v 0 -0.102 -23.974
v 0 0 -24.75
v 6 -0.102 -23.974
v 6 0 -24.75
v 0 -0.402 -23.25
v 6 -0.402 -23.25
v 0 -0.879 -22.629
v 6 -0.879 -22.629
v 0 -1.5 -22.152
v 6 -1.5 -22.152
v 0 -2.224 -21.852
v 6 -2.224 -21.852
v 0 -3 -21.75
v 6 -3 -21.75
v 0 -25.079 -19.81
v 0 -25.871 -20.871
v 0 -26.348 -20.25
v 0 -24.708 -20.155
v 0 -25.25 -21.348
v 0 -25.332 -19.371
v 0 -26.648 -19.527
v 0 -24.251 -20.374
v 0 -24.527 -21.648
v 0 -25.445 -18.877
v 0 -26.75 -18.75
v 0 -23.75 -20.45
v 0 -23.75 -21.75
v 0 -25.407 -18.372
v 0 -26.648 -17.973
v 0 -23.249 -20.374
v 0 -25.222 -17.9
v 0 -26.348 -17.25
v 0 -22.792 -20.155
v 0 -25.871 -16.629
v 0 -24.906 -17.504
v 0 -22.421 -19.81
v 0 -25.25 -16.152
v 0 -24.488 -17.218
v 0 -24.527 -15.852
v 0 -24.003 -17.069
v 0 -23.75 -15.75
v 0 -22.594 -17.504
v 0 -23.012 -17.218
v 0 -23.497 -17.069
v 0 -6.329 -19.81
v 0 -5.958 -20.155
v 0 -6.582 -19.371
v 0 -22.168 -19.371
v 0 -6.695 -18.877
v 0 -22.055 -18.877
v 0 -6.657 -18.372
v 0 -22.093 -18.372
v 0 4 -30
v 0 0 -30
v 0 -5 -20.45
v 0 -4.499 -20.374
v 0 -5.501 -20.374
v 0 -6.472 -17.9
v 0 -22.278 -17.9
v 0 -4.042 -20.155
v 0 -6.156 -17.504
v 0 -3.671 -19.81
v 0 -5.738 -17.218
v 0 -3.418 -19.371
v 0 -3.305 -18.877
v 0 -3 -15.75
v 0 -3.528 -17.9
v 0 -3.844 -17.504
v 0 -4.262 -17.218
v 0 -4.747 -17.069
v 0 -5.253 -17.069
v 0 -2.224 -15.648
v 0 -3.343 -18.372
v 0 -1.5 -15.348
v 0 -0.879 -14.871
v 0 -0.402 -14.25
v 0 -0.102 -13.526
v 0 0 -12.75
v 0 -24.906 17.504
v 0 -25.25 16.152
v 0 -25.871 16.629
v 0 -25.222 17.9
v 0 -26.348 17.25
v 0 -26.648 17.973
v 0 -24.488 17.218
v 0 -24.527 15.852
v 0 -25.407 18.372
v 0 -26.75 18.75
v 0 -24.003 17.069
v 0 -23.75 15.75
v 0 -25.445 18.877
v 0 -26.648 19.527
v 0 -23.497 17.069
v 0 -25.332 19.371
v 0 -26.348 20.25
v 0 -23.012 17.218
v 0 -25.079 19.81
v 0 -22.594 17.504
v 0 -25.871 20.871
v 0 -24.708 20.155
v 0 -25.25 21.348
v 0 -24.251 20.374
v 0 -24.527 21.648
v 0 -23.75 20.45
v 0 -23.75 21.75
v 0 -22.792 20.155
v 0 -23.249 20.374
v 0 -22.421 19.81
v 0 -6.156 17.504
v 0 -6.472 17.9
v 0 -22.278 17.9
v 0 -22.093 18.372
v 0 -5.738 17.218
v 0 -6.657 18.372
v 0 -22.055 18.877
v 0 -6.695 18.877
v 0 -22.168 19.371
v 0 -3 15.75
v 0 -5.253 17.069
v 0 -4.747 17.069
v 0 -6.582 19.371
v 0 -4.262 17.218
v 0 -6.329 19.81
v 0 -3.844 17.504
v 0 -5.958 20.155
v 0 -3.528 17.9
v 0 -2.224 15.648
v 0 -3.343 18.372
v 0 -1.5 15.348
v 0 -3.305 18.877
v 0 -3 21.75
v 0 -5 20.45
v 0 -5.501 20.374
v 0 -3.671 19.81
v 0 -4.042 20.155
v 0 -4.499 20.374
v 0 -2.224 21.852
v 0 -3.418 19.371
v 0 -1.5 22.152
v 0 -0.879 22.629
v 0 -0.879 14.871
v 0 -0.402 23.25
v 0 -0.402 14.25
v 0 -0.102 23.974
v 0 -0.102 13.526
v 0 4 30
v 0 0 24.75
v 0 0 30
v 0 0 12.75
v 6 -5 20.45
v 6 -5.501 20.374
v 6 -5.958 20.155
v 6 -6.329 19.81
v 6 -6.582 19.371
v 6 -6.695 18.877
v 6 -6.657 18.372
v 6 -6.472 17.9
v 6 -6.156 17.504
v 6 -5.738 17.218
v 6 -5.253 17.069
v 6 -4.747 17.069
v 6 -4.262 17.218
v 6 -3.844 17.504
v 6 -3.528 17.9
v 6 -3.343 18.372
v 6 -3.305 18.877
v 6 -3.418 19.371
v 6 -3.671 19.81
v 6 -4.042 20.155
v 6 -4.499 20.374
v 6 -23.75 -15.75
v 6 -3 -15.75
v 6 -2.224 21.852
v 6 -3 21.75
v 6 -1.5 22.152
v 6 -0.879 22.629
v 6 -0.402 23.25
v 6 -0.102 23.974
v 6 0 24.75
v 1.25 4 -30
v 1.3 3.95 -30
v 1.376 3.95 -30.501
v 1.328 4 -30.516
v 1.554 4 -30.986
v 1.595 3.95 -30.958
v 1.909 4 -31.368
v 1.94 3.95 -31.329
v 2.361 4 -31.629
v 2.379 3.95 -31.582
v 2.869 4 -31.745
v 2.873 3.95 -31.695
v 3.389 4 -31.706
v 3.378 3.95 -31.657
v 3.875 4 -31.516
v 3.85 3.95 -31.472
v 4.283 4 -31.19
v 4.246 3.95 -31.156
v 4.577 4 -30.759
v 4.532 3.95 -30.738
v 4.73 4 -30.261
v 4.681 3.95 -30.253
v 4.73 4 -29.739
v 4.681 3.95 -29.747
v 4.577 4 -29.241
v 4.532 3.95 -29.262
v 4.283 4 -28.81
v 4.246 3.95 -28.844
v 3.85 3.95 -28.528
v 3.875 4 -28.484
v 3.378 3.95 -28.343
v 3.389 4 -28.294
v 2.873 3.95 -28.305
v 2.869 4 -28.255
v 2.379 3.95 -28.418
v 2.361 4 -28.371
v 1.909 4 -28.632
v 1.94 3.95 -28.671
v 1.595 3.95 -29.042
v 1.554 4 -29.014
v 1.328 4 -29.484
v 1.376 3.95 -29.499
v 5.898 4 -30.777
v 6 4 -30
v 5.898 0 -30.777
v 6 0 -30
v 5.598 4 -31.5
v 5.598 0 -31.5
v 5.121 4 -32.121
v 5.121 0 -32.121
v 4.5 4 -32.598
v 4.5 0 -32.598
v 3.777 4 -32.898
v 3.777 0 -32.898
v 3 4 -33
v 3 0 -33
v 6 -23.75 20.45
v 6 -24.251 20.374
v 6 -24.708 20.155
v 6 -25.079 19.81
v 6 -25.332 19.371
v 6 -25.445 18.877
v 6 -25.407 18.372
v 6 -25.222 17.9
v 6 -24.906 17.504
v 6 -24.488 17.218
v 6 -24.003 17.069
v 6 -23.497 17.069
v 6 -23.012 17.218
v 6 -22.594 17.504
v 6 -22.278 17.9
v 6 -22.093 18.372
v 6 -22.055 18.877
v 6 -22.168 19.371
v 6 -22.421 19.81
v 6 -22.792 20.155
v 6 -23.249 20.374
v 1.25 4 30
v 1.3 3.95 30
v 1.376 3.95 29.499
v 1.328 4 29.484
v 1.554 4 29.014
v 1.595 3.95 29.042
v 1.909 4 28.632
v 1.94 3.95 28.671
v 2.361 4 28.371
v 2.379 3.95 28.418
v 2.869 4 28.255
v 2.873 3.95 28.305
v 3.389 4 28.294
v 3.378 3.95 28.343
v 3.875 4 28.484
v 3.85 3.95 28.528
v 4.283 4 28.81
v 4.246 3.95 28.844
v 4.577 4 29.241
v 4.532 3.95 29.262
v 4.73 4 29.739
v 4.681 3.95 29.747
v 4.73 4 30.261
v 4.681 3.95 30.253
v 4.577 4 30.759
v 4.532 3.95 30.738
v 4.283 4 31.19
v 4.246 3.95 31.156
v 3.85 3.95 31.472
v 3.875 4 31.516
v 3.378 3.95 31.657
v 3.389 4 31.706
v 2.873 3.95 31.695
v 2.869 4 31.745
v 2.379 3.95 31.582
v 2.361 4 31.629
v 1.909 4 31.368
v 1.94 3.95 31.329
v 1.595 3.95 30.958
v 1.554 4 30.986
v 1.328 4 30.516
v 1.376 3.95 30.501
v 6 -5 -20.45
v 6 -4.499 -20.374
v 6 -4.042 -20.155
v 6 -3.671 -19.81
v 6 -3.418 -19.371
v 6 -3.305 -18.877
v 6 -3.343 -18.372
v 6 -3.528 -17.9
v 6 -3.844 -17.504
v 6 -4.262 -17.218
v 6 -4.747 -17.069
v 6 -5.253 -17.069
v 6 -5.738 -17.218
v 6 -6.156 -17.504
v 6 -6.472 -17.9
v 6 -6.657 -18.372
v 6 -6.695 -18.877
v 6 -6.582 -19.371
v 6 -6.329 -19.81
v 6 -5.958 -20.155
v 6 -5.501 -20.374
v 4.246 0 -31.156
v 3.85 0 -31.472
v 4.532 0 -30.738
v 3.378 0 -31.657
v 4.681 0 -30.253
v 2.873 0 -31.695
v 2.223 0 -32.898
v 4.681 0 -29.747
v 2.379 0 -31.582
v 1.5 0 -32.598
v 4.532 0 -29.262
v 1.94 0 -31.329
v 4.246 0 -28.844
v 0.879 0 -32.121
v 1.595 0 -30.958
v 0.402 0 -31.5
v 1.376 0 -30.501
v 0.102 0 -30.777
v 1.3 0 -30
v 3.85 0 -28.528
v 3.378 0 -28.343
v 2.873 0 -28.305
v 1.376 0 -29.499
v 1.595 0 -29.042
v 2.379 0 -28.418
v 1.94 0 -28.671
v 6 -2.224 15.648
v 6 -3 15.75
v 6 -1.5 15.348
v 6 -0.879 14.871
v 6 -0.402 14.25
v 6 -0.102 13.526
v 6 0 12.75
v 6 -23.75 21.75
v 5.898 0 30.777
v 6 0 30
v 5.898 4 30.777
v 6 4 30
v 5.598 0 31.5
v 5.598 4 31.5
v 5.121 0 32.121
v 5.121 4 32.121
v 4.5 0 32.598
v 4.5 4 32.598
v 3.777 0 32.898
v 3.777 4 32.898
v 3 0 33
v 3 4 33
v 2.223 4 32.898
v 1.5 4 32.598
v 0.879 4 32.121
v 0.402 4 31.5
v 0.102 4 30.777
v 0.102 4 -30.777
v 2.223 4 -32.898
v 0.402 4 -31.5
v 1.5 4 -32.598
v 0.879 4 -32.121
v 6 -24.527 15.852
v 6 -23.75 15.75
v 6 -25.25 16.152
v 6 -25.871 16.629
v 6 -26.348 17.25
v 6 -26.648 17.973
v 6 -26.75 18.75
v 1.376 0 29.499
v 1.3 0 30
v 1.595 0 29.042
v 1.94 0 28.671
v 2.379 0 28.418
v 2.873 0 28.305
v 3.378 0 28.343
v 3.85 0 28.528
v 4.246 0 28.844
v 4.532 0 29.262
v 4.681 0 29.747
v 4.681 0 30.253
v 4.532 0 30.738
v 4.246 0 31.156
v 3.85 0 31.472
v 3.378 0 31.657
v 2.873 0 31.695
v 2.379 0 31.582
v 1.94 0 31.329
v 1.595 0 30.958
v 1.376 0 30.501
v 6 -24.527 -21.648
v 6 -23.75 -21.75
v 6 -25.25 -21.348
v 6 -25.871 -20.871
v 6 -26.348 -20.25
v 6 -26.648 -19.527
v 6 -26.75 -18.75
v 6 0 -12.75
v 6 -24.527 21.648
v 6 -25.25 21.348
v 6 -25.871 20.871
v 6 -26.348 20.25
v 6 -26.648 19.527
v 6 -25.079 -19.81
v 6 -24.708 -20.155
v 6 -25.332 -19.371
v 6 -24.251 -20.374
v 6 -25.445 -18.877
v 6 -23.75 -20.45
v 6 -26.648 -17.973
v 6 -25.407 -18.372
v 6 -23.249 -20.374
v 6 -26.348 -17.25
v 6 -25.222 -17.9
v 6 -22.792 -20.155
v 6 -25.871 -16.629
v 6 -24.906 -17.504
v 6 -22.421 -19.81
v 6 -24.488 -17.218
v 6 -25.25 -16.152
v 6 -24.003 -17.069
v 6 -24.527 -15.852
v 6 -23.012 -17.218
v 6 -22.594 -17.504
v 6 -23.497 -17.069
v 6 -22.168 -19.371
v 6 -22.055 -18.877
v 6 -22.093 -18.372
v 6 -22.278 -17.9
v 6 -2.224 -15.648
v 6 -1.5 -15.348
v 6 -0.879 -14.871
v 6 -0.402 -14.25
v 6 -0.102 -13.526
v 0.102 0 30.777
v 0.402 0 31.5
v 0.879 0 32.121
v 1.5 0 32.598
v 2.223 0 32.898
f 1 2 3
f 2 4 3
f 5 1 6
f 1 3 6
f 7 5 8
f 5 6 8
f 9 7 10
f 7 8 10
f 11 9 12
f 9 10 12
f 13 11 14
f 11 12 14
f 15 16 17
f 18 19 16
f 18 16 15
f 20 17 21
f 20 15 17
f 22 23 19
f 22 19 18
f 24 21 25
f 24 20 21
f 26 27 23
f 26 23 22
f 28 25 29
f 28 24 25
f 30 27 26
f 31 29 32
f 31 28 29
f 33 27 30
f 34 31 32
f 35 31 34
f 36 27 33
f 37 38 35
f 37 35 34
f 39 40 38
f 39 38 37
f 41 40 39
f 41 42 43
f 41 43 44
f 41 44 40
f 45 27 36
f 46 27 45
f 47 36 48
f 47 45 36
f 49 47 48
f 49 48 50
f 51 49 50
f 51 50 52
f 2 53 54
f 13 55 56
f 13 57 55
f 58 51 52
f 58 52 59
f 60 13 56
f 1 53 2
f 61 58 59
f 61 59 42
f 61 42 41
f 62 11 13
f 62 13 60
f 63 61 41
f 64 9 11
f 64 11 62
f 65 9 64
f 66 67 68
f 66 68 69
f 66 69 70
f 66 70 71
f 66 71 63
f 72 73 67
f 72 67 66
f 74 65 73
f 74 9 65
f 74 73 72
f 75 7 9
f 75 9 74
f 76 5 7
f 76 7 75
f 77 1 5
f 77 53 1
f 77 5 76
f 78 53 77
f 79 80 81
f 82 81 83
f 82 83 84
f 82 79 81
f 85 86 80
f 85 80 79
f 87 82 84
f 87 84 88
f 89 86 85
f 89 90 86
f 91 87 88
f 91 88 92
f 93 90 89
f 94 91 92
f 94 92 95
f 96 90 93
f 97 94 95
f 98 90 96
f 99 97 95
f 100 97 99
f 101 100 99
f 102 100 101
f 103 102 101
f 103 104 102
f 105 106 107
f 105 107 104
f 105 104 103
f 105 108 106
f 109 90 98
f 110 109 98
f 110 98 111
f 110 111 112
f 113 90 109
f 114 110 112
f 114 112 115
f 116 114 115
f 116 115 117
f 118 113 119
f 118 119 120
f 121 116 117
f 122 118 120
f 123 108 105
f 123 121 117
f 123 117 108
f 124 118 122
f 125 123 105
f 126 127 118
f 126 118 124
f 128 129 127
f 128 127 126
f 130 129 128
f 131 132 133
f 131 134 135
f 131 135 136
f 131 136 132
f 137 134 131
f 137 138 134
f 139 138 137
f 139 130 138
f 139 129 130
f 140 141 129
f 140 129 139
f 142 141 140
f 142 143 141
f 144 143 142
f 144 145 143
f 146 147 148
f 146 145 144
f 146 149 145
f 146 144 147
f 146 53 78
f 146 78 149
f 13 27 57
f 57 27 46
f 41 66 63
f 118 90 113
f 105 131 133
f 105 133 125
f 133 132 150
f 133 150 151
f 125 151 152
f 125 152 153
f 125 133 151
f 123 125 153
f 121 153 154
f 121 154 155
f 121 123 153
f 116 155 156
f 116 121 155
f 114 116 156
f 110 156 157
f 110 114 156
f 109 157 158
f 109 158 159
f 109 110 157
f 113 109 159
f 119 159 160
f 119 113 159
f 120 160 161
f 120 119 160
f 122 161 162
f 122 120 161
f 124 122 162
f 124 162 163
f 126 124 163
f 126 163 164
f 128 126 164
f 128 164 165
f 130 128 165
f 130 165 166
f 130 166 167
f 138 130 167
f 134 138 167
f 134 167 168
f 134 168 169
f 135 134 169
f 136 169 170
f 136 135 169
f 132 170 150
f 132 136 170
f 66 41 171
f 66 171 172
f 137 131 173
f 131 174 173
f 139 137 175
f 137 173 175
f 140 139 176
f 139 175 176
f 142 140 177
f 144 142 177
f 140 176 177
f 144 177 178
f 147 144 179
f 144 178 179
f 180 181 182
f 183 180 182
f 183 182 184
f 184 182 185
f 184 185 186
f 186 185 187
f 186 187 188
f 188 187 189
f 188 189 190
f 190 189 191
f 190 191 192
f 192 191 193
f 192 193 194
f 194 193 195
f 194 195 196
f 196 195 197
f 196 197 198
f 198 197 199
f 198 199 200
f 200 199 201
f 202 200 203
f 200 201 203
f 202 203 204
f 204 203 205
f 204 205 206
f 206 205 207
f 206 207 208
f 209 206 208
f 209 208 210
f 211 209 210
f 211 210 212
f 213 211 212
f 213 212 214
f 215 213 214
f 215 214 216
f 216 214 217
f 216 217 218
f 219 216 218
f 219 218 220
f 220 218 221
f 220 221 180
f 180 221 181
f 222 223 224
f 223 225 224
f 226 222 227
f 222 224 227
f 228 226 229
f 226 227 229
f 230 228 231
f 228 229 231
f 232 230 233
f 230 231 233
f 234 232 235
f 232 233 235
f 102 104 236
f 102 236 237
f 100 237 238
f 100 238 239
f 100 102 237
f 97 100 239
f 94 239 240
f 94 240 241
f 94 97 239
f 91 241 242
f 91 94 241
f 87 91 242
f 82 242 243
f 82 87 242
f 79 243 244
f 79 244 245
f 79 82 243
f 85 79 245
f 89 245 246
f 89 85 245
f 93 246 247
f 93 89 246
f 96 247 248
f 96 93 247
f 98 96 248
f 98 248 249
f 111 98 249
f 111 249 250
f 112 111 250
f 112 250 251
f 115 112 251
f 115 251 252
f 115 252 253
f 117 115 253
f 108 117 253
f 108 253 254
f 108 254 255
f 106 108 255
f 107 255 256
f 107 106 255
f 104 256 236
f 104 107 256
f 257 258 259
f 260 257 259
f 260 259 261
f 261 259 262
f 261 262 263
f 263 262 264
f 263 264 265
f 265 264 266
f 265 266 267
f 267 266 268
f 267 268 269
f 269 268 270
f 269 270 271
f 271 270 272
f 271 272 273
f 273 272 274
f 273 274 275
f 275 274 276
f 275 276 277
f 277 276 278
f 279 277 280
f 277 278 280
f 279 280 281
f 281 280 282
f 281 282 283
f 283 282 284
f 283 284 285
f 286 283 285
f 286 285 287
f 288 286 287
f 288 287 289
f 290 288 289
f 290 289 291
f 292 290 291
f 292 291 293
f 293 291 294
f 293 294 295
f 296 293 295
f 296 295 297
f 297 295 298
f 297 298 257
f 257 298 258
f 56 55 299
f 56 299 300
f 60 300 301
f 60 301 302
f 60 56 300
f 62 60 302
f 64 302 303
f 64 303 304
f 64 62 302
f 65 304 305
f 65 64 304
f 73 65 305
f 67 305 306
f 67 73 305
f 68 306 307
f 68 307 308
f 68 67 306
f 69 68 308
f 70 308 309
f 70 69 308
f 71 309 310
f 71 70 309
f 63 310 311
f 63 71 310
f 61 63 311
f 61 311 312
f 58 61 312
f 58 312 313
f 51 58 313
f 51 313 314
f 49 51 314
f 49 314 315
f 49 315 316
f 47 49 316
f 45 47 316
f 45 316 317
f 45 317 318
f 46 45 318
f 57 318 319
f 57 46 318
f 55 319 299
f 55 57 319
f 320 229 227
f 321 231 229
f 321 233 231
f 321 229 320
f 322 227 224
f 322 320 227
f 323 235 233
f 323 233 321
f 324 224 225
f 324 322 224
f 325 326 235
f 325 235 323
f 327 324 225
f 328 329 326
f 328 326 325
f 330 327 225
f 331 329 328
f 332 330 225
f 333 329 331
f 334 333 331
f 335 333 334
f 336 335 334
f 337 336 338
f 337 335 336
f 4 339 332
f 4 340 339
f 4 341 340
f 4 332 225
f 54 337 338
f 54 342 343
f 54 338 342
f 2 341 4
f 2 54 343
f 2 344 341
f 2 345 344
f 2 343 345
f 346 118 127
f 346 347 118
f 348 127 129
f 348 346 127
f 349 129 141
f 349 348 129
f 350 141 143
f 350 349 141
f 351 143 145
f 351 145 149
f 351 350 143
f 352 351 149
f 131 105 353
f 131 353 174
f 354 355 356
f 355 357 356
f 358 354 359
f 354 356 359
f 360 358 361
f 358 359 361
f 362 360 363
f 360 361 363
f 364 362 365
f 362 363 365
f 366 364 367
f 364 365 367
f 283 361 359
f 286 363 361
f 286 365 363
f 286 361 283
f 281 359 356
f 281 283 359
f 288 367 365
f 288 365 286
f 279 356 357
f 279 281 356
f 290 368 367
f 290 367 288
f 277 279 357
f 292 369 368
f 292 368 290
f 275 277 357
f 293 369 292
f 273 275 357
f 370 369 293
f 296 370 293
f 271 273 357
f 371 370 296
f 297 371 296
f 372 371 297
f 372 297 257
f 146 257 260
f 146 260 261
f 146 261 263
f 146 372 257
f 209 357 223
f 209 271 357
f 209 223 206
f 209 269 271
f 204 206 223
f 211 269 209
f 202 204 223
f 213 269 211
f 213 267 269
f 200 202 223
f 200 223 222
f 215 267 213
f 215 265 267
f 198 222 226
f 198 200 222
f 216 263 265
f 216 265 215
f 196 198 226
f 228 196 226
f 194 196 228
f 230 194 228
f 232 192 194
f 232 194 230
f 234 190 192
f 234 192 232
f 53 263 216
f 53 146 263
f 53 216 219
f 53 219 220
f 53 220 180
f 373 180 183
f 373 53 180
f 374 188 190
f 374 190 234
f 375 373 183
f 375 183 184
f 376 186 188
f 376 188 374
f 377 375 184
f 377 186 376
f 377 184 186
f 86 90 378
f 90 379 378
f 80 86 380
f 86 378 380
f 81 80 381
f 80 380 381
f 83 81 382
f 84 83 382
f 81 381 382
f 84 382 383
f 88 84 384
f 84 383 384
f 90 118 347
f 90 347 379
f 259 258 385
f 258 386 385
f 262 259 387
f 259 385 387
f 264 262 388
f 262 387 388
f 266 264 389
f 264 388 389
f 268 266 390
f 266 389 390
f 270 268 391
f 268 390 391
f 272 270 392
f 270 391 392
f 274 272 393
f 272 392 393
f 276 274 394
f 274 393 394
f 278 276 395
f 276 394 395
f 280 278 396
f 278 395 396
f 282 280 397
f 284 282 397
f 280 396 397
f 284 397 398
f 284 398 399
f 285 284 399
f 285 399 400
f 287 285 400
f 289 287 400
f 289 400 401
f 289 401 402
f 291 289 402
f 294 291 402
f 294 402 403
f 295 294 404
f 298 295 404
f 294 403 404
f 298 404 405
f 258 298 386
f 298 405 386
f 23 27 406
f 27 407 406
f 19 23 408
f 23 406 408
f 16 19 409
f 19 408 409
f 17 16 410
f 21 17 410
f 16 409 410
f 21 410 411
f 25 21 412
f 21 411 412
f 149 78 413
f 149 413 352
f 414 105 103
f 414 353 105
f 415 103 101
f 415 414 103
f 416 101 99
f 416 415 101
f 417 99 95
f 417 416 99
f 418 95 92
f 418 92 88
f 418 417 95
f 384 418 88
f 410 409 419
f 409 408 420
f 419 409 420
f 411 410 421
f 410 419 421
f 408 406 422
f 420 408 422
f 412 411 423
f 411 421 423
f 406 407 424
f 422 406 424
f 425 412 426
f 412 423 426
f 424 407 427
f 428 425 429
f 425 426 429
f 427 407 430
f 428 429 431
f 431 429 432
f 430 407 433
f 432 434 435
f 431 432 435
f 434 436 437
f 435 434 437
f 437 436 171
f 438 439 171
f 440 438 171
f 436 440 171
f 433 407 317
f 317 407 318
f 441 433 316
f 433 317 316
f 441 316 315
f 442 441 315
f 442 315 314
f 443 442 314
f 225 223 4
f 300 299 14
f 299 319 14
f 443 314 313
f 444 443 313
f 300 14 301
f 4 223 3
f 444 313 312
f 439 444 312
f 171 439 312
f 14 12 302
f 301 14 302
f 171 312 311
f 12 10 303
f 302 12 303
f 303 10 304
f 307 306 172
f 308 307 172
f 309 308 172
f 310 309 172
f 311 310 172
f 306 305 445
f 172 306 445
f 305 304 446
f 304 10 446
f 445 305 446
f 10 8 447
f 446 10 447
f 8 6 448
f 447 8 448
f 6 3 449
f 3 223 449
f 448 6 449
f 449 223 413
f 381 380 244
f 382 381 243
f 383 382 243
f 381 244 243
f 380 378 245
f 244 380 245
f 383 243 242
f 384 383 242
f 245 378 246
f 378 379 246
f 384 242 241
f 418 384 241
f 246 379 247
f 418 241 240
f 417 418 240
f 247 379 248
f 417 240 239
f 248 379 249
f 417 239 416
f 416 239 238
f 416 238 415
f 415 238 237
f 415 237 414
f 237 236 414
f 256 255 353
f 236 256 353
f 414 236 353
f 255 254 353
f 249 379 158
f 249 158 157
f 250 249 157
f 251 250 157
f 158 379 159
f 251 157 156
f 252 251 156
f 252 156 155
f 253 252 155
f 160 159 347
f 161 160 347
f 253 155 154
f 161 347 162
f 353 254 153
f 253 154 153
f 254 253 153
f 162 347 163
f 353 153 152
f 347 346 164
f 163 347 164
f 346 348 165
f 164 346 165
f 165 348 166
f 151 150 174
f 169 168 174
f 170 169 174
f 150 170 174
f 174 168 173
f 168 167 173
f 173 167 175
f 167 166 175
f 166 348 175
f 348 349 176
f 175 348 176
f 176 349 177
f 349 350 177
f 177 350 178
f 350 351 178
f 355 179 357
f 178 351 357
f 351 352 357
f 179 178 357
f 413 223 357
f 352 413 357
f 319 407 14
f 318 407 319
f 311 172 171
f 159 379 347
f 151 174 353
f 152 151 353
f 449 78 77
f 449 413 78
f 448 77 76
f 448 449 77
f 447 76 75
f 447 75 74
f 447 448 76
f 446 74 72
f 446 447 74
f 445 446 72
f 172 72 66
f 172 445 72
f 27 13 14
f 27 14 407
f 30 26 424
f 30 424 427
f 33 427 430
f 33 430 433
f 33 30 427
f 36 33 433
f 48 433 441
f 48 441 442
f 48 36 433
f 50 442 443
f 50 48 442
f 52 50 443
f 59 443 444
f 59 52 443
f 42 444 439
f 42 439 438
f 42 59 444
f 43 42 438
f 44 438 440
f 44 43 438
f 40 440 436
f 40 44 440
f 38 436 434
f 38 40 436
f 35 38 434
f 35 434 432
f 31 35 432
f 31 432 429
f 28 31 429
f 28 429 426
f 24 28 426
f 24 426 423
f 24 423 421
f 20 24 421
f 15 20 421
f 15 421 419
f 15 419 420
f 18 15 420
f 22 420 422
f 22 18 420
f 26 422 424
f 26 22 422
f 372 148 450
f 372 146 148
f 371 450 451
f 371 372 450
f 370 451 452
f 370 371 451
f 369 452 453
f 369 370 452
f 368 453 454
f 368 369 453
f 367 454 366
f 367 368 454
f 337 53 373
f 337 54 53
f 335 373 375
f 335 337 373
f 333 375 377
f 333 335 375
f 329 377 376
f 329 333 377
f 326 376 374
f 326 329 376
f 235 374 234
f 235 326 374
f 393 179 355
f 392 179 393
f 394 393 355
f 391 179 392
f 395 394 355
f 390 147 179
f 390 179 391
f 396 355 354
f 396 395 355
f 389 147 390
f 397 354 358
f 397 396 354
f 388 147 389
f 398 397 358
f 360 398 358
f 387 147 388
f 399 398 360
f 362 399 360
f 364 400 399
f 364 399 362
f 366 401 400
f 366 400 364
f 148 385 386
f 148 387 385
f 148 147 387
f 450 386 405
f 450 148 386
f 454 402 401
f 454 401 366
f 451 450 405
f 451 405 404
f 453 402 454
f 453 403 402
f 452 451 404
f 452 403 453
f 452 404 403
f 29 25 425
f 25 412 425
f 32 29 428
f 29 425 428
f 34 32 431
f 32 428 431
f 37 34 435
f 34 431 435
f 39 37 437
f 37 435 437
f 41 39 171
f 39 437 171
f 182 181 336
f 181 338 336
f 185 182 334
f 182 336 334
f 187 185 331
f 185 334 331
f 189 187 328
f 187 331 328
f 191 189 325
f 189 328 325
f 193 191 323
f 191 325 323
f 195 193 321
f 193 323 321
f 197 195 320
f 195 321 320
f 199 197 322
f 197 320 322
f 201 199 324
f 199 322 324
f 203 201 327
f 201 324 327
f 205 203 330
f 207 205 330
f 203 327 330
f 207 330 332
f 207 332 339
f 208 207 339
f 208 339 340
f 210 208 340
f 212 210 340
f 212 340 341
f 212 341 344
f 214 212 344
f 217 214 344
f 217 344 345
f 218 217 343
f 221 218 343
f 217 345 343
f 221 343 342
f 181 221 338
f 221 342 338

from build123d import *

# Parameters (mm, degrees)
SKETCH1_R                                       = 1.7
BOSS_EXTRUDE1_DEPTH                             = 6
CSK_FOR_M3_FLAT_HEAD_MACHINE_SCREW1_D           = 3.4
CSK_FOR_M3_FLAT_HEAD_MACHINE_SCREW1_DEPTH       = 6
CSK_FOR_M3_FLAT_HEAD_MACHINE_SCREW1_CSINK_D     = 3.5
CSK_FOR_M3_FLAT_HEAD_MACHINE_SCREW1_CSINK_ANGLE = 90
CSK_FOR_M3_FLAT_HEAD_MACHINE_SCREW1_TIP         = 1.021463052
FILLET1_R                                       = 3
FILLET2_R                                       = 3
FILLET3_R                                       = 3


with BuildPart() as part:
    # Sketch1 → Boss-Extrude1 (new body)
    with BuildSketch(Plane(origin=(0, 0, 0), x_dir=(0, 0, -1), z_dir=(1, 0, 0))):
        Polygon((-21.75, -26.75), (-21.75, 0), (-33, 0), (-33, 4), (33, 4), (33, 0), (21.75, 0), (21.75, -26.75), (15.75, -26.75), (15.75, 0), (-15.75, 0), (-15.75, -26.75), align=None)
        with Locations((18.75, -5)):
            Circle(SKETCH1_R, mode=Mode.SUBTRACT)
        with Locations((18.75, -23.75)):
            Circle(SKETCH1_R, mode=Mode.SUBTRACT)
        with Locations(Location((-18.75, -23.75, 0), (0, 0, 180))):
            Circle(SKETCH1_R, mode=Mode.SUBTRACT)
        with Locations(Location((-18.75, -5, 0), (0, 0, 180))):
            Circle(SKETCH1_R, mode=Mode.SUBTRACT)
    extrude(amount=BOSS_EXTRUDE1_DEPTH)

    # CSK for M3 Flat Head Machine Screw1
    with Locations(Plane(origin=(0, 4, 0), x_dir=(1, 0, 0), z_dir=(0, 1, 0))):
        with Locations((3, 30), (3, -30)):
            CounterSinkHole(CSK_FOR_M3_FLAT_HEAD_MACHINE_SCREW1_D / 2, CSK_FOR_M3_FLAT_HEAD_MACHINE_SCREW1_CSINK_D / 2, depth=CSK_FOR_M3_FLAT_HEAD_MACHINE_SCREW1_DEPTH, counter_sink_angle=CSK_FOR_M3_FLAT_HEAD_MACHINE_SCREW1_CSINK_ANGLE)
            with Locations((0, 0, -(CSK_FOR_M3_FLAT_HEAD_MACHINE_SCREW1_DEPTH + CSK_FOR_M3_FLAT_HEAD_MACHINE_SCREW1_TIP / 2))):  # 118° drill point
                Cone(0, CSK_FOR_M3_FLAT_HEAD_MACHINE_SCREW1_D / 2, CSK_FOR_M3_FLAT_HEAD_MACHINE_SCREW1_TIP, mode=Mode.SUBTRACT)

    # Fillet1
    fillet1_edges = [part.edges().sort_by_distance(p)[0] for p in [
        (3, -26.75, -21.75),
        (3, -26.75, -15.75),
        (3, -26.75, 15.75),
        (3, -26.75, 21.75),
    ]]
    fillet(fillet1_edges, radius=FILLET1_R - 0.0001)  # a hair under: the kernel refuses the full size

    # Fillet2
    fillet2_edges = [part.edges().sort_by_distance(p)[0] for p in [
        (3, 0, 21.75),
        (3, 0, -21.75),
        (3, 0, -15.75),
        (3, 0, 15.75),
    ]]
    fillet(fillet2_edges, radius=FILLET2_R)

    # Fillet3
    fillet3_edges = [part.edges().sort_by_distance(p)[0] for p in [
        (6, 2, -33),
        (0, 2, -33),
        (0, 2, 33),
        (6, 2, 33),
    ]]
    fillet(fillet3_edges, radius=FILLET3_R - 0.0001)  # a hair under: the kernel refuses the full size


solid = part.part
